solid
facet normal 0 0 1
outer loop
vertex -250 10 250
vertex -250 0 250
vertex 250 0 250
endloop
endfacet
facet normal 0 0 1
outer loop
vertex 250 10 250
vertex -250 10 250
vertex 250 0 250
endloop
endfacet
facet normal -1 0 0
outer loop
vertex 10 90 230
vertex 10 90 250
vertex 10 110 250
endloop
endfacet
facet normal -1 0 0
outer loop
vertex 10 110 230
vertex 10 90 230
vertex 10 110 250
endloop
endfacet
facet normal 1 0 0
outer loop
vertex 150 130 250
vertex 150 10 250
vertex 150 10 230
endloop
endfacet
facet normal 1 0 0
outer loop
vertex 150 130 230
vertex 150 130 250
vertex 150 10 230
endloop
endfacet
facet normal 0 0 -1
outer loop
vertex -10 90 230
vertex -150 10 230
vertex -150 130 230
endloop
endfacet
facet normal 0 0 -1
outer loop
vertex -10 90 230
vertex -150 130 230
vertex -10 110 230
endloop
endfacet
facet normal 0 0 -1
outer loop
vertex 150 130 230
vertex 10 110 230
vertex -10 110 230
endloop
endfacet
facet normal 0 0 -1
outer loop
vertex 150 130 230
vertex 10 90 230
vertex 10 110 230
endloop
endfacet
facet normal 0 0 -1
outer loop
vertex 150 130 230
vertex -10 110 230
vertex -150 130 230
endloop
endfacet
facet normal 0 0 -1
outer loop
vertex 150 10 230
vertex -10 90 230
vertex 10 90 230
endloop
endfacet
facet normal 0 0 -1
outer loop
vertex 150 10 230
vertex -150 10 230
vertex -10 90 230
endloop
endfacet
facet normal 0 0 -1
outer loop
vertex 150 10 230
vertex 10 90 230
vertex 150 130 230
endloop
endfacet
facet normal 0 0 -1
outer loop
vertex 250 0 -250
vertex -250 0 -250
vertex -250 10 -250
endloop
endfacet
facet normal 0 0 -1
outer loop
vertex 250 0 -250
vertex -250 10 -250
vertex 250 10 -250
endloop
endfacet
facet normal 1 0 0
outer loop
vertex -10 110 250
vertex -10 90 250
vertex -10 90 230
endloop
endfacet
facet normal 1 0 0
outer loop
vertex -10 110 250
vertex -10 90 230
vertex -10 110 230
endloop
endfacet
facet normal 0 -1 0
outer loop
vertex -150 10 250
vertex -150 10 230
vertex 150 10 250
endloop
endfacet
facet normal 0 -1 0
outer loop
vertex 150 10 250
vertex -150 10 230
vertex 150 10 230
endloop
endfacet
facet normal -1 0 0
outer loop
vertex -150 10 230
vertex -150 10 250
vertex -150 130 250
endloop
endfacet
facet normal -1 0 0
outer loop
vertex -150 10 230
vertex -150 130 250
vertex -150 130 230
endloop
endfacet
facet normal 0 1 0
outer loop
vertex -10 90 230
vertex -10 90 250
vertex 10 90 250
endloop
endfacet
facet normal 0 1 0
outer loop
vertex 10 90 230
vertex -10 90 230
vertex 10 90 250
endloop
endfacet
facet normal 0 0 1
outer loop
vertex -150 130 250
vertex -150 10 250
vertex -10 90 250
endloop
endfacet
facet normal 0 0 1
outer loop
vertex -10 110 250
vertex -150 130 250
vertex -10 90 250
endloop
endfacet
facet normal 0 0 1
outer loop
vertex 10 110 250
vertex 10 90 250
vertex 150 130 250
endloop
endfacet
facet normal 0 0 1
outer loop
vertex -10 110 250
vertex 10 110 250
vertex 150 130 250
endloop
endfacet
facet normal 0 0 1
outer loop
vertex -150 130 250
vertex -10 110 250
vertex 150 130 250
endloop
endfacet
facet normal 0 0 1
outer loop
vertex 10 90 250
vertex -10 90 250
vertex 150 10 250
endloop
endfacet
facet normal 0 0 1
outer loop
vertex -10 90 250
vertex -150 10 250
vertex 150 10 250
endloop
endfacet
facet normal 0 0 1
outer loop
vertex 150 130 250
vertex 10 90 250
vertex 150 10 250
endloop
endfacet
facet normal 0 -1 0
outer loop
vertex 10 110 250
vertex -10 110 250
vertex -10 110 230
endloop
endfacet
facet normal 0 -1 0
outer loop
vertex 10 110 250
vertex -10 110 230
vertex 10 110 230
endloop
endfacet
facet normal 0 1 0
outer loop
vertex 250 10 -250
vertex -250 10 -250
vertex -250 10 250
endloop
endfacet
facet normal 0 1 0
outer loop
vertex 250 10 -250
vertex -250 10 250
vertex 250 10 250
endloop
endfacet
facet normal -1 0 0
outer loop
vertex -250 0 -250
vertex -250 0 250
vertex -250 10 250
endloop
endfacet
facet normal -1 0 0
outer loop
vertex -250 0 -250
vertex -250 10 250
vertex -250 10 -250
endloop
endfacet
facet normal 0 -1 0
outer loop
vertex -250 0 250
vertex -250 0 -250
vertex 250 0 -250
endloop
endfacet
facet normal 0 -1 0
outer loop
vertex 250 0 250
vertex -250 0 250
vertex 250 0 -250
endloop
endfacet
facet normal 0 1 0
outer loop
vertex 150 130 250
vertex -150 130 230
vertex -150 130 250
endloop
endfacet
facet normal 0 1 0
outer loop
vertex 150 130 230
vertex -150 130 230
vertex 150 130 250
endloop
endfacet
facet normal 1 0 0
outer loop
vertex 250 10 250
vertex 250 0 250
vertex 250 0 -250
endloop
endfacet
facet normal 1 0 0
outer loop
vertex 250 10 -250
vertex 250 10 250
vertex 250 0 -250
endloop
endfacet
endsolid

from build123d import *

# Parameters (mm, degrees)
SKETCH1_W           = 500
SKETCH1_H           = 500
BOSS_EXTRUDE1_DEPTH = 10
SKETCH5_W           = 300
SKETCH5_H           = 20
BOSS_EXTRUDE4_DEPTH = 120
SKETCH7_W           = 20
SKETCH7_H           = 20
CUT_EXTRUDE1_DEPTH  = 574.933794091


with BuildPart() as part:
    # Sketch1 → Boss-Extrude1 (new body)
    with BuildSketch(Plane(origin=(0, 0, 0), x_dir=(1, 0, 0), z_dir=(0, 1, 0))):
        Rectangle(SKETCH1_W, SKETCH1_H)
    extrude(amount=BOSS_EXTRUDE1_DEPTH)


with BuildPart() as body_2:
    # Sketch5 → Boss-Extrude4 (new body)
    with BuildSketch(Plane(origin=(0, 10, 0), x_dir=(1, 0, 0), z_dir=(0, 1, 0))):
        with Locations((0, -240)):
            Rectangle(SKETCH5_W, SKETCH5_H)
    extrude(amount=BOSS_EXTRUDE4_DEPTH)

    # Sketch7 → Cut-Extrude1 (cut, through all)
    with BuildSketch(Plane.XY.offset(250)):
        with Locations((0, 100)):
            Rectangle(SKETCH7_W, SKETCH7_H)
    extrude(amount=-CUT_EXTRUDE1_DEPTH, mode=Mode.SUBTRACT)


solid = Compound([part.part, body_2.part])
